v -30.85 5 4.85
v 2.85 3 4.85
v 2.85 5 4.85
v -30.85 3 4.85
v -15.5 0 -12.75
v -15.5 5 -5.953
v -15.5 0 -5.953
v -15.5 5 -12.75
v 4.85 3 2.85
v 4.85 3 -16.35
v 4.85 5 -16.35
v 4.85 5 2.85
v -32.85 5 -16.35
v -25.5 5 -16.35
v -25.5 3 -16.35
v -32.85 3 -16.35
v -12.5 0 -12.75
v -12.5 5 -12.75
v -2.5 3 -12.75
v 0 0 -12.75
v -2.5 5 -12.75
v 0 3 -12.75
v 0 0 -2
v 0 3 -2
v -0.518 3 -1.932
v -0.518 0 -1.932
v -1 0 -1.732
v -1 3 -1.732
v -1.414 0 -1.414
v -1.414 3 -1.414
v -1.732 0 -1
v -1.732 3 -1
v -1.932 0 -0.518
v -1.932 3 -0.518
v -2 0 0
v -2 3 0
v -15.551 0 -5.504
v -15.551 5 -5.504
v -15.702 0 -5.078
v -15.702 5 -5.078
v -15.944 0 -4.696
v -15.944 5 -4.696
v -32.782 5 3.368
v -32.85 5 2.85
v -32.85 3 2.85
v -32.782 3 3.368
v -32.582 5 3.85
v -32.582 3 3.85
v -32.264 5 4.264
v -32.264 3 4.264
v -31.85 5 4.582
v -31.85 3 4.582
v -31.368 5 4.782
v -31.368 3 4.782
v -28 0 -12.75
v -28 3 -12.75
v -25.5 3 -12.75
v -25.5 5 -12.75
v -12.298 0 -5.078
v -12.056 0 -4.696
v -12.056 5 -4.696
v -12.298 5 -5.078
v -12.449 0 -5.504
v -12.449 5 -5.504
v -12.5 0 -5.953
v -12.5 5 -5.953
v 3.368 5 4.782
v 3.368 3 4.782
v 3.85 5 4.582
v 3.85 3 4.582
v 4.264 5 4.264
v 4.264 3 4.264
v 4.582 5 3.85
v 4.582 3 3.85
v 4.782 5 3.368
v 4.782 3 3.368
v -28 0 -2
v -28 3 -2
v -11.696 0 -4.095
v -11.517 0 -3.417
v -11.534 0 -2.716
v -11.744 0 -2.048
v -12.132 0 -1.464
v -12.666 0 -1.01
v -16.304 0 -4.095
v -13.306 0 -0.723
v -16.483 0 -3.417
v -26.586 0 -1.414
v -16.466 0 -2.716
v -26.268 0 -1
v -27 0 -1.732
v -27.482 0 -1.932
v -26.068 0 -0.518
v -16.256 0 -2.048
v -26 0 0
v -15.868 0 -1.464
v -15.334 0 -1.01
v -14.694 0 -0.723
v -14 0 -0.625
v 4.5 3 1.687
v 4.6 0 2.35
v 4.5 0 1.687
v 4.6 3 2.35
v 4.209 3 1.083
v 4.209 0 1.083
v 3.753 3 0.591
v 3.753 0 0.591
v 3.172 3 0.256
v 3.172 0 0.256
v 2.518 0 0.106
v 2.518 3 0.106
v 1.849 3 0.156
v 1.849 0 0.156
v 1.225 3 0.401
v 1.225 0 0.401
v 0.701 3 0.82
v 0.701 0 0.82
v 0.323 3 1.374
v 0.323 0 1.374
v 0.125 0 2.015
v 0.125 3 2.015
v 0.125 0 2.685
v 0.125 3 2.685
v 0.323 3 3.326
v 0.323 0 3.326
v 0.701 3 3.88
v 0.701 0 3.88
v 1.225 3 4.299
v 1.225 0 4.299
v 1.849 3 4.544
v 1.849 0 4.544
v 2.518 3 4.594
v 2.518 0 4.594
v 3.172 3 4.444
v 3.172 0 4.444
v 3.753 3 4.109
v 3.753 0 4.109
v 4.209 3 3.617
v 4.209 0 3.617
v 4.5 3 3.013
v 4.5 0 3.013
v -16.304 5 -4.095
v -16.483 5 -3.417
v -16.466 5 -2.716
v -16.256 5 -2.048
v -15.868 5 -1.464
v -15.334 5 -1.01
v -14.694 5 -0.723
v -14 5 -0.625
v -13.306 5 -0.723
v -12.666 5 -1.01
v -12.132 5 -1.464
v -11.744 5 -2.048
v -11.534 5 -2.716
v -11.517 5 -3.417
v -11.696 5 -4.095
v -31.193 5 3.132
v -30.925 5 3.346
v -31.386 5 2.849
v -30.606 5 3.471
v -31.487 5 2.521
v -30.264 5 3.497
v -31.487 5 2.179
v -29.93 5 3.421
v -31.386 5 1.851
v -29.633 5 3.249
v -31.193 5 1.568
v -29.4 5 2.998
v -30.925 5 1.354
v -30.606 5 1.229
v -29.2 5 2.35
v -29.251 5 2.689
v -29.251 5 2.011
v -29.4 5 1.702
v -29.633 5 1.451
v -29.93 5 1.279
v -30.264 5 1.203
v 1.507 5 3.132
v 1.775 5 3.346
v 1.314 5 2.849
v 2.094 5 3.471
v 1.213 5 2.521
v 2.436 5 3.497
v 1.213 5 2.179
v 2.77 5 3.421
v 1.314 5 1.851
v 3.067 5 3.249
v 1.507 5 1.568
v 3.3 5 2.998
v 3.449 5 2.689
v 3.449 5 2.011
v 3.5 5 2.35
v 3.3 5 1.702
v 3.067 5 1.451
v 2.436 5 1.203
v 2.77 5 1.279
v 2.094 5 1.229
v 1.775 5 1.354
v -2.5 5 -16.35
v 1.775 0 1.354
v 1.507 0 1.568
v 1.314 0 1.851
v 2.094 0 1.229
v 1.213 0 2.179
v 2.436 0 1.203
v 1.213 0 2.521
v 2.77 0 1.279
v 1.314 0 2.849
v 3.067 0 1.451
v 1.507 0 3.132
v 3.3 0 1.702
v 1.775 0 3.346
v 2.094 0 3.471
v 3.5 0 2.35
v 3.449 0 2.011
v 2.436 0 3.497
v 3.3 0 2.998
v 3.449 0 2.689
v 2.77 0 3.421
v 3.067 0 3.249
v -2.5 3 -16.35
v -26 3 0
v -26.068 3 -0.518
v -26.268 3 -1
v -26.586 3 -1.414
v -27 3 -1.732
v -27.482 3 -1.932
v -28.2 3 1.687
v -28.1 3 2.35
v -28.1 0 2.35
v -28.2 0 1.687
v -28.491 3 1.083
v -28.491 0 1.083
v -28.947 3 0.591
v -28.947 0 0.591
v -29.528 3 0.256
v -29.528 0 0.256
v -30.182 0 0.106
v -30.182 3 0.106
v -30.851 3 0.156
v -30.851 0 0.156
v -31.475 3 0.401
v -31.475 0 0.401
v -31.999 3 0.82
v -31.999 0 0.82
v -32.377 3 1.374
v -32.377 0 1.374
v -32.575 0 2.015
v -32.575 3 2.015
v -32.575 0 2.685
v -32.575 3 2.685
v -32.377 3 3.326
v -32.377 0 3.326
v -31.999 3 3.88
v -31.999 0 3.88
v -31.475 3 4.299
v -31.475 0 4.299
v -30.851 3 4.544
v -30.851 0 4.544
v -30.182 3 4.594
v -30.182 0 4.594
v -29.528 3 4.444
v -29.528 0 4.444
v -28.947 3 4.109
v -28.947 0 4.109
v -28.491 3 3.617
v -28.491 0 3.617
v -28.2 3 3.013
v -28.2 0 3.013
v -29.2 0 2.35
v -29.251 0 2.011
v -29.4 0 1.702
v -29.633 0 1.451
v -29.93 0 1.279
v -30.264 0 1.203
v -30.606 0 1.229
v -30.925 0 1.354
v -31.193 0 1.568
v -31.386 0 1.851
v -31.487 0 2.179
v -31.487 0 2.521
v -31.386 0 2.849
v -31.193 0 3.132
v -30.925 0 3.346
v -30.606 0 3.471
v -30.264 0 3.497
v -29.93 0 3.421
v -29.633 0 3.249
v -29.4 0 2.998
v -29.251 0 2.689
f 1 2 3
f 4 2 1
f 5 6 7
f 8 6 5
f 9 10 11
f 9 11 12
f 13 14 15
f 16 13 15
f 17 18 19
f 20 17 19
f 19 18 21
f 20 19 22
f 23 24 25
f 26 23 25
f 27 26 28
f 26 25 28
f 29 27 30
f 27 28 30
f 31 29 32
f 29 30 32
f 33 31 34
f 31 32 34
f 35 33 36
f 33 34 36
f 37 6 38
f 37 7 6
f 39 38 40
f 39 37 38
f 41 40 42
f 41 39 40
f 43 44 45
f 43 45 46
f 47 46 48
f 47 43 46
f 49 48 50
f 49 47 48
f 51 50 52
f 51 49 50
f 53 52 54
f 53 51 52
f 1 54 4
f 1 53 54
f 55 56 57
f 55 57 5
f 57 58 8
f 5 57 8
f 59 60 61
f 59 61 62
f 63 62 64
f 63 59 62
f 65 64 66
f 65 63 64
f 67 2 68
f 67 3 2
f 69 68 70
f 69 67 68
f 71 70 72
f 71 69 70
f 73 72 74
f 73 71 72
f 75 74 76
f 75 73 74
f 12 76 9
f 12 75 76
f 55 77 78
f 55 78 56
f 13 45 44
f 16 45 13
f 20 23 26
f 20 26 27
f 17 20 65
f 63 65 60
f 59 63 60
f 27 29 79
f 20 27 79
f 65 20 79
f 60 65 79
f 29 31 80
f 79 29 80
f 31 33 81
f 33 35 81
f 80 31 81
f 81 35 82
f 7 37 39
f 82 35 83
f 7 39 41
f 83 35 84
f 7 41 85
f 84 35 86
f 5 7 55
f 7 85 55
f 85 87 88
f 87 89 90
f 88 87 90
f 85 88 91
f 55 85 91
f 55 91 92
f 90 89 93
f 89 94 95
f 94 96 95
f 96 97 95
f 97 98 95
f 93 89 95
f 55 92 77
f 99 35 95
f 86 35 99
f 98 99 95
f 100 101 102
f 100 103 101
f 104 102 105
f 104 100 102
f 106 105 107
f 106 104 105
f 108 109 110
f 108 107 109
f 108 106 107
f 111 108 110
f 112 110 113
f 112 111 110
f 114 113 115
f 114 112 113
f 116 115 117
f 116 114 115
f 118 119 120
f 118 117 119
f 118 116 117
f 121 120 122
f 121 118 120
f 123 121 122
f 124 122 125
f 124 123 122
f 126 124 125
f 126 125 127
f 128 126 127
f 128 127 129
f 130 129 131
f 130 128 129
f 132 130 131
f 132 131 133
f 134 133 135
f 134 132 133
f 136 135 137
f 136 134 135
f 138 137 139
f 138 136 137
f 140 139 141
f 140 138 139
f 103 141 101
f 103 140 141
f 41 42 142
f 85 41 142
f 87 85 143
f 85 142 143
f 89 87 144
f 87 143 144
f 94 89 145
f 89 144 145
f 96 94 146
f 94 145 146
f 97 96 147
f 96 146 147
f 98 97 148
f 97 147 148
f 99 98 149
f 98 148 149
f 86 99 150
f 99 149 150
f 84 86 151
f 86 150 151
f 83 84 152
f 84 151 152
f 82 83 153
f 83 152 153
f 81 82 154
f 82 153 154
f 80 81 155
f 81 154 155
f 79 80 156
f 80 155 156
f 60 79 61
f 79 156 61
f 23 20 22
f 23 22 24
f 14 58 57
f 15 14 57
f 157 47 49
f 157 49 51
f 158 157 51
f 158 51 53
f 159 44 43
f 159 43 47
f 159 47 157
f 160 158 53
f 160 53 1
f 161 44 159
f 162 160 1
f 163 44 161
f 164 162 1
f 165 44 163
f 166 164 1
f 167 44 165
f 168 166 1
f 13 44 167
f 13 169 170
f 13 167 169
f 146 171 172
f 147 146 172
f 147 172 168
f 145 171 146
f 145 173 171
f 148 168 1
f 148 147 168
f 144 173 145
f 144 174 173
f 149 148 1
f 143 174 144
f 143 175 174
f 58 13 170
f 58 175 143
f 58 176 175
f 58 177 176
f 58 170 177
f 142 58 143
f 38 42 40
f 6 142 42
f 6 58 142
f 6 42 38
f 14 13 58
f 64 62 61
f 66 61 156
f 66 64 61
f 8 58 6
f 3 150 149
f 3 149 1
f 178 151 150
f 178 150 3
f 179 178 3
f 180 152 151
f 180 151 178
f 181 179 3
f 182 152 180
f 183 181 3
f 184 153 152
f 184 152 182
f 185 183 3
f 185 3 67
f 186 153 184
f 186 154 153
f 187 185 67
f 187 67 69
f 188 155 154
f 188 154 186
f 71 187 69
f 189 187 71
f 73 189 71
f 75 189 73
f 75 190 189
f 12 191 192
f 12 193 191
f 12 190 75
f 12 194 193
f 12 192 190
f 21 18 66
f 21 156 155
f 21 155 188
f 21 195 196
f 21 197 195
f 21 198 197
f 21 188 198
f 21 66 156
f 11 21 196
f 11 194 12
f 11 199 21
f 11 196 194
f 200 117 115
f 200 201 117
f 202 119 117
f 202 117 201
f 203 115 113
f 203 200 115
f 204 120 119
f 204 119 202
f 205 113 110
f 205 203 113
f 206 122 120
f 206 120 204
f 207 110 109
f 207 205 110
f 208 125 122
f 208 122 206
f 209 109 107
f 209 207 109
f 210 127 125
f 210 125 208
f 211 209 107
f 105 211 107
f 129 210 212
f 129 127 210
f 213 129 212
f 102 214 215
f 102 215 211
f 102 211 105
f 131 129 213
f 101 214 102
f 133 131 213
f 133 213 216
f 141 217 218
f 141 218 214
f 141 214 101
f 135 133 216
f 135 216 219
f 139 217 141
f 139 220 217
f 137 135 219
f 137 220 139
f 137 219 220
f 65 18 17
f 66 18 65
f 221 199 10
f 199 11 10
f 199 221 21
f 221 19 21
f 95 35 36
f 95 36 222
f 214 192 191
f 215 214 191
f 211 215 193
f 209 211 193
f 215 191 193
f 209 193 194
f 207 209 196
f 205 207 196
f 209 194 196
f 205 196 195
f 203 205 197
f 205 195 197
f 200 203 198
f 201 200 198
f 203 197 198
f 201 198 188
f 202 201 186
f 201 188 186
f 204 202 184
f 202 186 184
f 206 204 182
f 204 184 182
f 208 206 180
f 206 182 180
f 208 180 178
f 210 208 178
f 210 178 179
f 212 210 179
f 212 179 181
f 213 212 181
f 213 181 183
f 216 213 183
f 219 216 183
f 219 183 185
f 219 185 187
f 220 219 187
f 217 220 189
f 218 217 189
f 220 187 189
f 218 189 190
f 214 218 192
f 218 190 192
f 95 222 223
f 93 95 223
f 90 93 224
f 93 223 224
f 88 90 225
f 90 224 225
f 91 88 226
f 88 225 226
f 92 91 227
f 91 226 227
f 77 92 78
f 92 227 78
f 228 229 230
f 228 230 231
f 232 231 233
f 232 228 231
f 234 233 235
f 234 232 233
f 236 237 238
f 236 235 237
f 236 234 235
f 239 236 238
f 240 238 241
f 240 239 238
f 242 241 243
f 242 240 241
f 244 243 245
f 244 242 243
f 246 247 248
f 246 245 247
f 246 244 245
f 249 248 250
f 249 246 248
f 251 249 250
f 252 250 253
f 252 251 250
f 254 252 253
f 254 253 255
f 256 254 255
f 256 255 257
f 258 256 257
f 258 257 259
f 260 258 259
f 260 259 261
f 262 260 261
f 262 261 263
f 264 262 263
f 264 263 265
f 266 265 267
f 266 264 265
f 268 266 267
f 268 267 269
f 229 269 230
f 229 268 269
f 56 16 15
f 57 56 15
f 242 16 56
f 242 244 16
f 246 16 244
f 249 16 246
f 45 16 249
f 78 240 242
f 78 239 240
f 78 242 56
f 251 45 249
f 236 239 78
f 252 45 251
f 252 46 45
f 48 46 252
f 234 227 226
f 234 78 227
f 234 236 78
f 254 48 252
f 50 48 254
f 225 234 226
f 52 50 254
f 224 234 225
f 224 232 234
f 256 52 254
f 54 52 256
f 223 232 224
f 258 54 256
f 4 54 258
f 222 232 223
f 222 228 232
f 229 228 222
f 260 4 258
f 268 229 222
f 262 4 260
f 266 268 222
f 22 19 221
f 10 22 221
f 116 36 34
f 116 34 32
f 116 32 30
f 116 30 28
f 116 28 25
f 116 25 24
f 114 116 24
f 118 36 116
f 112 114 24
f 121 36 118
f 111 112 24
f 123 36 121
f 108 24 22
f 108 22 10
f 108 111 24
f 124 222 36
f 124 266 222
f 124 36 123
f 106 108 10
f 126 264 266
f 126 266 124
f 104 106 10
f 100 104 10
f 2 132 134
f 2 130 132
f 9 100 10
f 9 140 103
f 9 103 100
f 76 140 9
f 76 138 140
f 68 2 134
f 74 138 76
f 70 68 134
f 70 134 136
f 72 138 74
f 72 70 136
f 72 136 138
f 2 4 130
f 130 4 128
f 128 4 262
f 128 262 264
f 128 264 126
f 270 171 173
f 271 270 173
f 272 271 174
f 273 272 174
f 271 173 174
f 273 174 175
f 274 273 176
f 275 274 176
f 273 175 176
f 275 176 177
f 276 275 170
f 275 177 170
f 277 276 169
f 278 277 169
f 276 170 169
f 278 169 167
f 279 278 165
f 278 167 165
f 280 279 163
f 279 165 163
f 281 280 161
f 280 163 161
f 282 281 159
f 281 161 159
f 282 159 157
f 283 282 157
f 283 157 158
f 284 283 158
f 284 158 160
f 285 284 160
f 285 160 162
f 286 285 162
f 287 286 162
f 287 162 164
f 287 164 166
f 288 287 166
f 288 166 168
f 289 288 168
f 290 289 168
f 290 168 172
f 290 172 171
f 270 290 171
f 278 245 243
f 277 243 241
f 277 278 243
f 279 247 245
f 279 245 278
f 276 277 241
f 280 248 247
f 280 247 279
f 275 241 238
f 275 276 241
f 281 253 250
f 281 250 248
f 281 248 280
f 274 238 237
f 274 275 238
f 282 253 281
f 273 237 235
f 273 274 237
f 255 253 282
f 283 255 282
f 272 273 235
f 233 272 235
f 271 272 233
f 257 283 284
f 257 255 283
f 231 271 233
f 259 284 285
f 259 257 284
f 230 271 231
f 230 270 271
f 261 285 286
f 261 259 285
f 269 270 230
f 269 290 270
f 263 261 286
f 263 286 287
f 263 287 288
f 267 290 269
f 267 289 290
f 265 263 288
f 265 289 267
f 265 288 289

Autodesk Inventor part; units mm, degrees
ref_plane "YZ Plane" through (0, 0, 0) normal (1, 0, 0) x (0, 1, 0)
ref_plane "XZ Plane" through (0, 0, 0) normal (0, 1, 0) x (-1, 0, 0)
ref_plane "XY Plane" through (0, 0, 0) normal (0, 0, 1) x (1, 0, 0)
sketch "Sketch1" plane through (0, 0, 0) normal (0, 1, 0) x (-1, 0, 0)
  line L0 (0, 0) -> (28, 0)
  line L1 (28, 0) -> (28, -38.5)
  line L2 (28, -38.5) -> (0, -38.5)
  line L3 (0, -38.5) -> (0, 0)
  dimension "d0" = 28
  dimension "d1" = 38.5
extrude "Extrusion1" add sketch "Sketch1" along normal blind 3
sketch "Sketch2" plane through (0, 3, 0) normal (0, 1, 0) x (1, 0, 0)
  line L0 (-28, 0) -> (0, 0) projected
  circle A0 centre (0, 0) radius 2
  circle A1 centre (-28, 0) radius 2
  line L1 (0, 38.5) -> (-28, 38.5) projected
  circle A2 centre (-28, 38.5) radius 2
  circle A3 centre (0, 38.5) radius 2
  dimension "d8" = 4
  dimension "d9" = 4
  dimension "d10" = 4
  dimension "d11" = 4
extrude "Extrusion2" cut sketch "Sketch2" against normal blind 3
sketch "Sketch3" plane through (0, 3, 0) normal (0, 1, 0) x (1, 0, 0)
  line L0 (-32.85, 43.35) -> (4.85, 43.35)
  line L1 (4.85, 43.35) -> (4.85, -4.85)
  line L2 (4.85, -4.85) -> (-32.85, -4.85)
  line L3 (-32.85, -4.85) -> (-32.85, 43.35)
  line L4 (-2, 38.5) -> (-26, 38.5) projected
  line L5 (0, 2) -> (0, 36.5) projected
  point P0 (0, 0)
  point P1 (-2, 6.25)
  point P2 (-26, 32.25)
  dimension "d14" = 48.2
  dimension "d15" = 37.7
  dimension "d16" = 4.85
  dimension "d17" = 4.85
extrude "Extrusion3" add sketch "Sketch3" along normal blind 2
sketch "Sketch4" plane through (0, 3, 0) normal (0, -1, 0) x (1, 0, 0)
  circle A0 centre (2.35, -40.85) radius 2.25
  line L0 (-2, -38.5) -> (-26, -38.5) projected
  line L1 (0, -2) -> (0, -36.5) projected
  circle A1 centre (-30.35, -40.85) radius 2.25
  line L2 (-28, -36.5) -> (-28, -2) projected
  circle A2 centre (-30.35, 2.35) radius 2.25
  line L3 (-26, 0) -> (-2, 0) projected
  circle A3 centre (2.35, 2.35) radius 2.25
  point P0 (0, 0)
  dimension "d20" = 4.5
  dimension "d21" = 2.35
  dimension "d22" = 2.35
  dimension "d23" = 4.5
  dimension "d24" = 2.35
  dimension "d25" = 2.35
  dimension "d26" = 4.5
  dimension "d27" = 2.35
  dimension "d28" = 4.5
  dimension "d29" = 2.35
  dimension "d30" = 2.35
  dimension "d31" = 2.35
extrude "Extrusion4" add sketch "Sketch4" along normal blind 3
fillet "Fillet1" radius 2 4 edges at (4.85, 4, -43.35) (4.85, 4, 4.85) (-32.85, 4, 4.85) (-32.85, 4, -43.35)
sketch "Sketch5" plane through (0, 5, 0) normal (0, 1, 0) x (1, 0, 0)
  circle A0 centre (0, 19.25) radius 1
  circle A1 centre (-28, 19.25) radius 1
  line L0 (4.85, -2.85) -> (4.85, 41.35) projected
  line L1 (-30.85, -4.85) -> (2.85, -4.85) projected
  point P0 (0, 0)
  dimension "d45" = 2
  dimension "d46" = 2
  dimension "d73" = 28
  dimension "d81" = 24.1
  dimension "d82" = 4.85
extrude "Extrusion6" cut sketch "Sketch5" against normal through all
sketch "Sketch8" plane through (0, 5, 0) normal (0, 1, 0) x (1, 0, 0)
  circle A0 centre (-14, 3.125) radius 2.5
  line L0 (-2, 6.25) -> (-26, 6.25) projected
  line L1 (-26, 0) -> (-2, 0) projected
  line L2 (-32.85, 41.35) -> (-32.85, -2.85) projected
  point P0 (0, 0)
  dimension "d68" = 5
  dimension "d69" = 3.125
  dimension "d70" = 18.85
extrude "Extrusion9" cut sketch "Sketch8" against normal through all
sketch "Sketch10" plane through (0, 5, 0) normal (0, 1, 0) x (1, 0, 0)
  line L0 (-25.5, 12.75) -> (-2.5, 12.75)
  line L1 (-2.5, 12.75) -> (-2.5, 25.75)
  line L2 (-2.5, 25.75) -> (-25.5, 25.75)
  line L3 (-25.5, 25.75) -> (-25.5, 12.75)
  line L4 (-32.85, 41.35) -> (-32.85, -2.85) projected
  circle A0 centre (-28, 19.25) radius 1 projected
  point P0 (0, 0)
  dimension "d83" = 23
  dimension "d84" = 13
  dimension "d85" = 7.35
  dimension "d86" = 6.5
extrude "Extrusion11" cut sketch "Sketch10" against normal through all contours L3 L2 L1 L0
sketch "Sketch11" plane through (0, 5, 0) normal (0, 1, 0) x (1, 0, 0)
  line L0 (-32.85, 41.35) -> (-32.85, -2.85) projected
  line L1 (-32.85, 12.75) -> (4.85, 12.75)
  line L2 (4.85, 12.75) -> (4.85, 43.35)
  line L3 (4.85, 43.35) -> (-32.85, 43.35)
  line L4 (-32.85, 43.35) -> (-32.85, 12.75)
  line L5 (-2.5, 12.75) -> (-25.5, 12.75) projected
  point P0 (0, 0)
  point P1 (-30.85, 43.35)
  point P2 (4.85, 41.35)
extrude "Extrusion12" cut sketch "Sketch11" against normal through all
sketch "Sketch9" plane through (0, 5, 0) normal (0, 1, 0) x (1, 0, 0)
  circle A0 centre (-14, 3.125) radius 2.5 projected
  line L0 (-15.5, 5.125) -> (-15.5, 12.75)
  line L1 (-15.5, 12.75) -> (-12.5, 12.75)
  line L2 (-12.5, 12.75) -> (-12.5, 5.125)
  arc A1 (-12.5, 5.125) -> (-15.5, 5.125) centre (-14, 3.125) ccw
  line L3 (4.85, 12.75) -> (-32.85, 12.75) projected
  point P0 (0, 0)
  point P1 (-14, 12.75)
  point P2 (-14, 12.75)
  dimension "d76" = 3
  dimension "d77" = 1.5
extrude "Extrusion13" cut sketch "Sketch9" against normal through all contours A0 L0 L1 L2
fillet "Fillet3" radius 2 2 edges at (-15.5, 2.5, -5.125) (-12.5, 2.5, -5.125)
sketch "Sketch12" plane through (2.35, 0, 2.35) normal (0, -1, 0) x (1, 0, 0)
  point P0 (-2.35, -2.35)
sketch "Sketch13" plane through (0, 5, 0) normal (0, 1, 0) x (1, 0, 0)
  circle A0 centre (2.35, -2.35) radius 2.25 projected
  circle A1 centre (2.35, -2.35) radius 1.15
  circle A2 centre (-30.35, -2.35) radius 2.25 projected
  circle A3 centre (-30.35, -2.35) radius 1.15
  point P0 (0, 0)
  dimension "d96" = 2.3
  dimension "d97" = 2.3
extrude "Extrusion14" cut sketch "Sketch13" against normal through all contours A1 | A3
sketch "Sketch15" plane through (0, 0, -12.75) normal (0, 0, -1) x (-1, 0, 0)
  line L0 (0, 3) -> (-4.85, 3) projected
  line L1 (30.85, 5) -> (-2.85, 5) projected
  line L2 (-4.85, 3) -> (2.5, 3)
  line L3 (2.5, 3) -> (2.5, 5)
  line L4 (2.5, 5) -> (-4.85, 5)
  line L5 (-4.85, 5) -> (-4.85, 3)
  line L6 (32.85, 5) -> (32.85, 3) projected
  line L7 (32.85, 5) -> (25.5, 5)
  line L8 (25.5, 5) -> (25.5, 3)
  line L9 (25.5, 3) -> (32.85, 3)
  line L10 (32.85, 3) -> (32.85, 5)
  point P0 (0, 0)
  point P1 (28, 0)
  dimension "d109" = 2.5
  dimension "d110" = 2.5
extrude "Extrusion16" add sketch "Sketch15" along normal blind 4
sketch "Sketch16" plane through (4.85, 3, 2.85) normal (1, 0, 0) x (0, 0, -1)
  line L0 (19.6, 2) -> (0, 2) projected
  line L1 (19.6, 0) -> (0, 0) projected
  line L2 (19.6, 2) -> (19.2, 2)
  line L3 (19.2, 2) -> (19.2, 0)
  line L4 (19.2, 0) -> (19.6, 0)
  line L5 (19.6, 0) -> (19.6, 2)
  point P0 (2.85, -3)
  dimension "d111" = 0.4
extrude "Extrusion17" cut sketch "Sketch16" against normal through all
properties part number "ServoFullMountInsert"
